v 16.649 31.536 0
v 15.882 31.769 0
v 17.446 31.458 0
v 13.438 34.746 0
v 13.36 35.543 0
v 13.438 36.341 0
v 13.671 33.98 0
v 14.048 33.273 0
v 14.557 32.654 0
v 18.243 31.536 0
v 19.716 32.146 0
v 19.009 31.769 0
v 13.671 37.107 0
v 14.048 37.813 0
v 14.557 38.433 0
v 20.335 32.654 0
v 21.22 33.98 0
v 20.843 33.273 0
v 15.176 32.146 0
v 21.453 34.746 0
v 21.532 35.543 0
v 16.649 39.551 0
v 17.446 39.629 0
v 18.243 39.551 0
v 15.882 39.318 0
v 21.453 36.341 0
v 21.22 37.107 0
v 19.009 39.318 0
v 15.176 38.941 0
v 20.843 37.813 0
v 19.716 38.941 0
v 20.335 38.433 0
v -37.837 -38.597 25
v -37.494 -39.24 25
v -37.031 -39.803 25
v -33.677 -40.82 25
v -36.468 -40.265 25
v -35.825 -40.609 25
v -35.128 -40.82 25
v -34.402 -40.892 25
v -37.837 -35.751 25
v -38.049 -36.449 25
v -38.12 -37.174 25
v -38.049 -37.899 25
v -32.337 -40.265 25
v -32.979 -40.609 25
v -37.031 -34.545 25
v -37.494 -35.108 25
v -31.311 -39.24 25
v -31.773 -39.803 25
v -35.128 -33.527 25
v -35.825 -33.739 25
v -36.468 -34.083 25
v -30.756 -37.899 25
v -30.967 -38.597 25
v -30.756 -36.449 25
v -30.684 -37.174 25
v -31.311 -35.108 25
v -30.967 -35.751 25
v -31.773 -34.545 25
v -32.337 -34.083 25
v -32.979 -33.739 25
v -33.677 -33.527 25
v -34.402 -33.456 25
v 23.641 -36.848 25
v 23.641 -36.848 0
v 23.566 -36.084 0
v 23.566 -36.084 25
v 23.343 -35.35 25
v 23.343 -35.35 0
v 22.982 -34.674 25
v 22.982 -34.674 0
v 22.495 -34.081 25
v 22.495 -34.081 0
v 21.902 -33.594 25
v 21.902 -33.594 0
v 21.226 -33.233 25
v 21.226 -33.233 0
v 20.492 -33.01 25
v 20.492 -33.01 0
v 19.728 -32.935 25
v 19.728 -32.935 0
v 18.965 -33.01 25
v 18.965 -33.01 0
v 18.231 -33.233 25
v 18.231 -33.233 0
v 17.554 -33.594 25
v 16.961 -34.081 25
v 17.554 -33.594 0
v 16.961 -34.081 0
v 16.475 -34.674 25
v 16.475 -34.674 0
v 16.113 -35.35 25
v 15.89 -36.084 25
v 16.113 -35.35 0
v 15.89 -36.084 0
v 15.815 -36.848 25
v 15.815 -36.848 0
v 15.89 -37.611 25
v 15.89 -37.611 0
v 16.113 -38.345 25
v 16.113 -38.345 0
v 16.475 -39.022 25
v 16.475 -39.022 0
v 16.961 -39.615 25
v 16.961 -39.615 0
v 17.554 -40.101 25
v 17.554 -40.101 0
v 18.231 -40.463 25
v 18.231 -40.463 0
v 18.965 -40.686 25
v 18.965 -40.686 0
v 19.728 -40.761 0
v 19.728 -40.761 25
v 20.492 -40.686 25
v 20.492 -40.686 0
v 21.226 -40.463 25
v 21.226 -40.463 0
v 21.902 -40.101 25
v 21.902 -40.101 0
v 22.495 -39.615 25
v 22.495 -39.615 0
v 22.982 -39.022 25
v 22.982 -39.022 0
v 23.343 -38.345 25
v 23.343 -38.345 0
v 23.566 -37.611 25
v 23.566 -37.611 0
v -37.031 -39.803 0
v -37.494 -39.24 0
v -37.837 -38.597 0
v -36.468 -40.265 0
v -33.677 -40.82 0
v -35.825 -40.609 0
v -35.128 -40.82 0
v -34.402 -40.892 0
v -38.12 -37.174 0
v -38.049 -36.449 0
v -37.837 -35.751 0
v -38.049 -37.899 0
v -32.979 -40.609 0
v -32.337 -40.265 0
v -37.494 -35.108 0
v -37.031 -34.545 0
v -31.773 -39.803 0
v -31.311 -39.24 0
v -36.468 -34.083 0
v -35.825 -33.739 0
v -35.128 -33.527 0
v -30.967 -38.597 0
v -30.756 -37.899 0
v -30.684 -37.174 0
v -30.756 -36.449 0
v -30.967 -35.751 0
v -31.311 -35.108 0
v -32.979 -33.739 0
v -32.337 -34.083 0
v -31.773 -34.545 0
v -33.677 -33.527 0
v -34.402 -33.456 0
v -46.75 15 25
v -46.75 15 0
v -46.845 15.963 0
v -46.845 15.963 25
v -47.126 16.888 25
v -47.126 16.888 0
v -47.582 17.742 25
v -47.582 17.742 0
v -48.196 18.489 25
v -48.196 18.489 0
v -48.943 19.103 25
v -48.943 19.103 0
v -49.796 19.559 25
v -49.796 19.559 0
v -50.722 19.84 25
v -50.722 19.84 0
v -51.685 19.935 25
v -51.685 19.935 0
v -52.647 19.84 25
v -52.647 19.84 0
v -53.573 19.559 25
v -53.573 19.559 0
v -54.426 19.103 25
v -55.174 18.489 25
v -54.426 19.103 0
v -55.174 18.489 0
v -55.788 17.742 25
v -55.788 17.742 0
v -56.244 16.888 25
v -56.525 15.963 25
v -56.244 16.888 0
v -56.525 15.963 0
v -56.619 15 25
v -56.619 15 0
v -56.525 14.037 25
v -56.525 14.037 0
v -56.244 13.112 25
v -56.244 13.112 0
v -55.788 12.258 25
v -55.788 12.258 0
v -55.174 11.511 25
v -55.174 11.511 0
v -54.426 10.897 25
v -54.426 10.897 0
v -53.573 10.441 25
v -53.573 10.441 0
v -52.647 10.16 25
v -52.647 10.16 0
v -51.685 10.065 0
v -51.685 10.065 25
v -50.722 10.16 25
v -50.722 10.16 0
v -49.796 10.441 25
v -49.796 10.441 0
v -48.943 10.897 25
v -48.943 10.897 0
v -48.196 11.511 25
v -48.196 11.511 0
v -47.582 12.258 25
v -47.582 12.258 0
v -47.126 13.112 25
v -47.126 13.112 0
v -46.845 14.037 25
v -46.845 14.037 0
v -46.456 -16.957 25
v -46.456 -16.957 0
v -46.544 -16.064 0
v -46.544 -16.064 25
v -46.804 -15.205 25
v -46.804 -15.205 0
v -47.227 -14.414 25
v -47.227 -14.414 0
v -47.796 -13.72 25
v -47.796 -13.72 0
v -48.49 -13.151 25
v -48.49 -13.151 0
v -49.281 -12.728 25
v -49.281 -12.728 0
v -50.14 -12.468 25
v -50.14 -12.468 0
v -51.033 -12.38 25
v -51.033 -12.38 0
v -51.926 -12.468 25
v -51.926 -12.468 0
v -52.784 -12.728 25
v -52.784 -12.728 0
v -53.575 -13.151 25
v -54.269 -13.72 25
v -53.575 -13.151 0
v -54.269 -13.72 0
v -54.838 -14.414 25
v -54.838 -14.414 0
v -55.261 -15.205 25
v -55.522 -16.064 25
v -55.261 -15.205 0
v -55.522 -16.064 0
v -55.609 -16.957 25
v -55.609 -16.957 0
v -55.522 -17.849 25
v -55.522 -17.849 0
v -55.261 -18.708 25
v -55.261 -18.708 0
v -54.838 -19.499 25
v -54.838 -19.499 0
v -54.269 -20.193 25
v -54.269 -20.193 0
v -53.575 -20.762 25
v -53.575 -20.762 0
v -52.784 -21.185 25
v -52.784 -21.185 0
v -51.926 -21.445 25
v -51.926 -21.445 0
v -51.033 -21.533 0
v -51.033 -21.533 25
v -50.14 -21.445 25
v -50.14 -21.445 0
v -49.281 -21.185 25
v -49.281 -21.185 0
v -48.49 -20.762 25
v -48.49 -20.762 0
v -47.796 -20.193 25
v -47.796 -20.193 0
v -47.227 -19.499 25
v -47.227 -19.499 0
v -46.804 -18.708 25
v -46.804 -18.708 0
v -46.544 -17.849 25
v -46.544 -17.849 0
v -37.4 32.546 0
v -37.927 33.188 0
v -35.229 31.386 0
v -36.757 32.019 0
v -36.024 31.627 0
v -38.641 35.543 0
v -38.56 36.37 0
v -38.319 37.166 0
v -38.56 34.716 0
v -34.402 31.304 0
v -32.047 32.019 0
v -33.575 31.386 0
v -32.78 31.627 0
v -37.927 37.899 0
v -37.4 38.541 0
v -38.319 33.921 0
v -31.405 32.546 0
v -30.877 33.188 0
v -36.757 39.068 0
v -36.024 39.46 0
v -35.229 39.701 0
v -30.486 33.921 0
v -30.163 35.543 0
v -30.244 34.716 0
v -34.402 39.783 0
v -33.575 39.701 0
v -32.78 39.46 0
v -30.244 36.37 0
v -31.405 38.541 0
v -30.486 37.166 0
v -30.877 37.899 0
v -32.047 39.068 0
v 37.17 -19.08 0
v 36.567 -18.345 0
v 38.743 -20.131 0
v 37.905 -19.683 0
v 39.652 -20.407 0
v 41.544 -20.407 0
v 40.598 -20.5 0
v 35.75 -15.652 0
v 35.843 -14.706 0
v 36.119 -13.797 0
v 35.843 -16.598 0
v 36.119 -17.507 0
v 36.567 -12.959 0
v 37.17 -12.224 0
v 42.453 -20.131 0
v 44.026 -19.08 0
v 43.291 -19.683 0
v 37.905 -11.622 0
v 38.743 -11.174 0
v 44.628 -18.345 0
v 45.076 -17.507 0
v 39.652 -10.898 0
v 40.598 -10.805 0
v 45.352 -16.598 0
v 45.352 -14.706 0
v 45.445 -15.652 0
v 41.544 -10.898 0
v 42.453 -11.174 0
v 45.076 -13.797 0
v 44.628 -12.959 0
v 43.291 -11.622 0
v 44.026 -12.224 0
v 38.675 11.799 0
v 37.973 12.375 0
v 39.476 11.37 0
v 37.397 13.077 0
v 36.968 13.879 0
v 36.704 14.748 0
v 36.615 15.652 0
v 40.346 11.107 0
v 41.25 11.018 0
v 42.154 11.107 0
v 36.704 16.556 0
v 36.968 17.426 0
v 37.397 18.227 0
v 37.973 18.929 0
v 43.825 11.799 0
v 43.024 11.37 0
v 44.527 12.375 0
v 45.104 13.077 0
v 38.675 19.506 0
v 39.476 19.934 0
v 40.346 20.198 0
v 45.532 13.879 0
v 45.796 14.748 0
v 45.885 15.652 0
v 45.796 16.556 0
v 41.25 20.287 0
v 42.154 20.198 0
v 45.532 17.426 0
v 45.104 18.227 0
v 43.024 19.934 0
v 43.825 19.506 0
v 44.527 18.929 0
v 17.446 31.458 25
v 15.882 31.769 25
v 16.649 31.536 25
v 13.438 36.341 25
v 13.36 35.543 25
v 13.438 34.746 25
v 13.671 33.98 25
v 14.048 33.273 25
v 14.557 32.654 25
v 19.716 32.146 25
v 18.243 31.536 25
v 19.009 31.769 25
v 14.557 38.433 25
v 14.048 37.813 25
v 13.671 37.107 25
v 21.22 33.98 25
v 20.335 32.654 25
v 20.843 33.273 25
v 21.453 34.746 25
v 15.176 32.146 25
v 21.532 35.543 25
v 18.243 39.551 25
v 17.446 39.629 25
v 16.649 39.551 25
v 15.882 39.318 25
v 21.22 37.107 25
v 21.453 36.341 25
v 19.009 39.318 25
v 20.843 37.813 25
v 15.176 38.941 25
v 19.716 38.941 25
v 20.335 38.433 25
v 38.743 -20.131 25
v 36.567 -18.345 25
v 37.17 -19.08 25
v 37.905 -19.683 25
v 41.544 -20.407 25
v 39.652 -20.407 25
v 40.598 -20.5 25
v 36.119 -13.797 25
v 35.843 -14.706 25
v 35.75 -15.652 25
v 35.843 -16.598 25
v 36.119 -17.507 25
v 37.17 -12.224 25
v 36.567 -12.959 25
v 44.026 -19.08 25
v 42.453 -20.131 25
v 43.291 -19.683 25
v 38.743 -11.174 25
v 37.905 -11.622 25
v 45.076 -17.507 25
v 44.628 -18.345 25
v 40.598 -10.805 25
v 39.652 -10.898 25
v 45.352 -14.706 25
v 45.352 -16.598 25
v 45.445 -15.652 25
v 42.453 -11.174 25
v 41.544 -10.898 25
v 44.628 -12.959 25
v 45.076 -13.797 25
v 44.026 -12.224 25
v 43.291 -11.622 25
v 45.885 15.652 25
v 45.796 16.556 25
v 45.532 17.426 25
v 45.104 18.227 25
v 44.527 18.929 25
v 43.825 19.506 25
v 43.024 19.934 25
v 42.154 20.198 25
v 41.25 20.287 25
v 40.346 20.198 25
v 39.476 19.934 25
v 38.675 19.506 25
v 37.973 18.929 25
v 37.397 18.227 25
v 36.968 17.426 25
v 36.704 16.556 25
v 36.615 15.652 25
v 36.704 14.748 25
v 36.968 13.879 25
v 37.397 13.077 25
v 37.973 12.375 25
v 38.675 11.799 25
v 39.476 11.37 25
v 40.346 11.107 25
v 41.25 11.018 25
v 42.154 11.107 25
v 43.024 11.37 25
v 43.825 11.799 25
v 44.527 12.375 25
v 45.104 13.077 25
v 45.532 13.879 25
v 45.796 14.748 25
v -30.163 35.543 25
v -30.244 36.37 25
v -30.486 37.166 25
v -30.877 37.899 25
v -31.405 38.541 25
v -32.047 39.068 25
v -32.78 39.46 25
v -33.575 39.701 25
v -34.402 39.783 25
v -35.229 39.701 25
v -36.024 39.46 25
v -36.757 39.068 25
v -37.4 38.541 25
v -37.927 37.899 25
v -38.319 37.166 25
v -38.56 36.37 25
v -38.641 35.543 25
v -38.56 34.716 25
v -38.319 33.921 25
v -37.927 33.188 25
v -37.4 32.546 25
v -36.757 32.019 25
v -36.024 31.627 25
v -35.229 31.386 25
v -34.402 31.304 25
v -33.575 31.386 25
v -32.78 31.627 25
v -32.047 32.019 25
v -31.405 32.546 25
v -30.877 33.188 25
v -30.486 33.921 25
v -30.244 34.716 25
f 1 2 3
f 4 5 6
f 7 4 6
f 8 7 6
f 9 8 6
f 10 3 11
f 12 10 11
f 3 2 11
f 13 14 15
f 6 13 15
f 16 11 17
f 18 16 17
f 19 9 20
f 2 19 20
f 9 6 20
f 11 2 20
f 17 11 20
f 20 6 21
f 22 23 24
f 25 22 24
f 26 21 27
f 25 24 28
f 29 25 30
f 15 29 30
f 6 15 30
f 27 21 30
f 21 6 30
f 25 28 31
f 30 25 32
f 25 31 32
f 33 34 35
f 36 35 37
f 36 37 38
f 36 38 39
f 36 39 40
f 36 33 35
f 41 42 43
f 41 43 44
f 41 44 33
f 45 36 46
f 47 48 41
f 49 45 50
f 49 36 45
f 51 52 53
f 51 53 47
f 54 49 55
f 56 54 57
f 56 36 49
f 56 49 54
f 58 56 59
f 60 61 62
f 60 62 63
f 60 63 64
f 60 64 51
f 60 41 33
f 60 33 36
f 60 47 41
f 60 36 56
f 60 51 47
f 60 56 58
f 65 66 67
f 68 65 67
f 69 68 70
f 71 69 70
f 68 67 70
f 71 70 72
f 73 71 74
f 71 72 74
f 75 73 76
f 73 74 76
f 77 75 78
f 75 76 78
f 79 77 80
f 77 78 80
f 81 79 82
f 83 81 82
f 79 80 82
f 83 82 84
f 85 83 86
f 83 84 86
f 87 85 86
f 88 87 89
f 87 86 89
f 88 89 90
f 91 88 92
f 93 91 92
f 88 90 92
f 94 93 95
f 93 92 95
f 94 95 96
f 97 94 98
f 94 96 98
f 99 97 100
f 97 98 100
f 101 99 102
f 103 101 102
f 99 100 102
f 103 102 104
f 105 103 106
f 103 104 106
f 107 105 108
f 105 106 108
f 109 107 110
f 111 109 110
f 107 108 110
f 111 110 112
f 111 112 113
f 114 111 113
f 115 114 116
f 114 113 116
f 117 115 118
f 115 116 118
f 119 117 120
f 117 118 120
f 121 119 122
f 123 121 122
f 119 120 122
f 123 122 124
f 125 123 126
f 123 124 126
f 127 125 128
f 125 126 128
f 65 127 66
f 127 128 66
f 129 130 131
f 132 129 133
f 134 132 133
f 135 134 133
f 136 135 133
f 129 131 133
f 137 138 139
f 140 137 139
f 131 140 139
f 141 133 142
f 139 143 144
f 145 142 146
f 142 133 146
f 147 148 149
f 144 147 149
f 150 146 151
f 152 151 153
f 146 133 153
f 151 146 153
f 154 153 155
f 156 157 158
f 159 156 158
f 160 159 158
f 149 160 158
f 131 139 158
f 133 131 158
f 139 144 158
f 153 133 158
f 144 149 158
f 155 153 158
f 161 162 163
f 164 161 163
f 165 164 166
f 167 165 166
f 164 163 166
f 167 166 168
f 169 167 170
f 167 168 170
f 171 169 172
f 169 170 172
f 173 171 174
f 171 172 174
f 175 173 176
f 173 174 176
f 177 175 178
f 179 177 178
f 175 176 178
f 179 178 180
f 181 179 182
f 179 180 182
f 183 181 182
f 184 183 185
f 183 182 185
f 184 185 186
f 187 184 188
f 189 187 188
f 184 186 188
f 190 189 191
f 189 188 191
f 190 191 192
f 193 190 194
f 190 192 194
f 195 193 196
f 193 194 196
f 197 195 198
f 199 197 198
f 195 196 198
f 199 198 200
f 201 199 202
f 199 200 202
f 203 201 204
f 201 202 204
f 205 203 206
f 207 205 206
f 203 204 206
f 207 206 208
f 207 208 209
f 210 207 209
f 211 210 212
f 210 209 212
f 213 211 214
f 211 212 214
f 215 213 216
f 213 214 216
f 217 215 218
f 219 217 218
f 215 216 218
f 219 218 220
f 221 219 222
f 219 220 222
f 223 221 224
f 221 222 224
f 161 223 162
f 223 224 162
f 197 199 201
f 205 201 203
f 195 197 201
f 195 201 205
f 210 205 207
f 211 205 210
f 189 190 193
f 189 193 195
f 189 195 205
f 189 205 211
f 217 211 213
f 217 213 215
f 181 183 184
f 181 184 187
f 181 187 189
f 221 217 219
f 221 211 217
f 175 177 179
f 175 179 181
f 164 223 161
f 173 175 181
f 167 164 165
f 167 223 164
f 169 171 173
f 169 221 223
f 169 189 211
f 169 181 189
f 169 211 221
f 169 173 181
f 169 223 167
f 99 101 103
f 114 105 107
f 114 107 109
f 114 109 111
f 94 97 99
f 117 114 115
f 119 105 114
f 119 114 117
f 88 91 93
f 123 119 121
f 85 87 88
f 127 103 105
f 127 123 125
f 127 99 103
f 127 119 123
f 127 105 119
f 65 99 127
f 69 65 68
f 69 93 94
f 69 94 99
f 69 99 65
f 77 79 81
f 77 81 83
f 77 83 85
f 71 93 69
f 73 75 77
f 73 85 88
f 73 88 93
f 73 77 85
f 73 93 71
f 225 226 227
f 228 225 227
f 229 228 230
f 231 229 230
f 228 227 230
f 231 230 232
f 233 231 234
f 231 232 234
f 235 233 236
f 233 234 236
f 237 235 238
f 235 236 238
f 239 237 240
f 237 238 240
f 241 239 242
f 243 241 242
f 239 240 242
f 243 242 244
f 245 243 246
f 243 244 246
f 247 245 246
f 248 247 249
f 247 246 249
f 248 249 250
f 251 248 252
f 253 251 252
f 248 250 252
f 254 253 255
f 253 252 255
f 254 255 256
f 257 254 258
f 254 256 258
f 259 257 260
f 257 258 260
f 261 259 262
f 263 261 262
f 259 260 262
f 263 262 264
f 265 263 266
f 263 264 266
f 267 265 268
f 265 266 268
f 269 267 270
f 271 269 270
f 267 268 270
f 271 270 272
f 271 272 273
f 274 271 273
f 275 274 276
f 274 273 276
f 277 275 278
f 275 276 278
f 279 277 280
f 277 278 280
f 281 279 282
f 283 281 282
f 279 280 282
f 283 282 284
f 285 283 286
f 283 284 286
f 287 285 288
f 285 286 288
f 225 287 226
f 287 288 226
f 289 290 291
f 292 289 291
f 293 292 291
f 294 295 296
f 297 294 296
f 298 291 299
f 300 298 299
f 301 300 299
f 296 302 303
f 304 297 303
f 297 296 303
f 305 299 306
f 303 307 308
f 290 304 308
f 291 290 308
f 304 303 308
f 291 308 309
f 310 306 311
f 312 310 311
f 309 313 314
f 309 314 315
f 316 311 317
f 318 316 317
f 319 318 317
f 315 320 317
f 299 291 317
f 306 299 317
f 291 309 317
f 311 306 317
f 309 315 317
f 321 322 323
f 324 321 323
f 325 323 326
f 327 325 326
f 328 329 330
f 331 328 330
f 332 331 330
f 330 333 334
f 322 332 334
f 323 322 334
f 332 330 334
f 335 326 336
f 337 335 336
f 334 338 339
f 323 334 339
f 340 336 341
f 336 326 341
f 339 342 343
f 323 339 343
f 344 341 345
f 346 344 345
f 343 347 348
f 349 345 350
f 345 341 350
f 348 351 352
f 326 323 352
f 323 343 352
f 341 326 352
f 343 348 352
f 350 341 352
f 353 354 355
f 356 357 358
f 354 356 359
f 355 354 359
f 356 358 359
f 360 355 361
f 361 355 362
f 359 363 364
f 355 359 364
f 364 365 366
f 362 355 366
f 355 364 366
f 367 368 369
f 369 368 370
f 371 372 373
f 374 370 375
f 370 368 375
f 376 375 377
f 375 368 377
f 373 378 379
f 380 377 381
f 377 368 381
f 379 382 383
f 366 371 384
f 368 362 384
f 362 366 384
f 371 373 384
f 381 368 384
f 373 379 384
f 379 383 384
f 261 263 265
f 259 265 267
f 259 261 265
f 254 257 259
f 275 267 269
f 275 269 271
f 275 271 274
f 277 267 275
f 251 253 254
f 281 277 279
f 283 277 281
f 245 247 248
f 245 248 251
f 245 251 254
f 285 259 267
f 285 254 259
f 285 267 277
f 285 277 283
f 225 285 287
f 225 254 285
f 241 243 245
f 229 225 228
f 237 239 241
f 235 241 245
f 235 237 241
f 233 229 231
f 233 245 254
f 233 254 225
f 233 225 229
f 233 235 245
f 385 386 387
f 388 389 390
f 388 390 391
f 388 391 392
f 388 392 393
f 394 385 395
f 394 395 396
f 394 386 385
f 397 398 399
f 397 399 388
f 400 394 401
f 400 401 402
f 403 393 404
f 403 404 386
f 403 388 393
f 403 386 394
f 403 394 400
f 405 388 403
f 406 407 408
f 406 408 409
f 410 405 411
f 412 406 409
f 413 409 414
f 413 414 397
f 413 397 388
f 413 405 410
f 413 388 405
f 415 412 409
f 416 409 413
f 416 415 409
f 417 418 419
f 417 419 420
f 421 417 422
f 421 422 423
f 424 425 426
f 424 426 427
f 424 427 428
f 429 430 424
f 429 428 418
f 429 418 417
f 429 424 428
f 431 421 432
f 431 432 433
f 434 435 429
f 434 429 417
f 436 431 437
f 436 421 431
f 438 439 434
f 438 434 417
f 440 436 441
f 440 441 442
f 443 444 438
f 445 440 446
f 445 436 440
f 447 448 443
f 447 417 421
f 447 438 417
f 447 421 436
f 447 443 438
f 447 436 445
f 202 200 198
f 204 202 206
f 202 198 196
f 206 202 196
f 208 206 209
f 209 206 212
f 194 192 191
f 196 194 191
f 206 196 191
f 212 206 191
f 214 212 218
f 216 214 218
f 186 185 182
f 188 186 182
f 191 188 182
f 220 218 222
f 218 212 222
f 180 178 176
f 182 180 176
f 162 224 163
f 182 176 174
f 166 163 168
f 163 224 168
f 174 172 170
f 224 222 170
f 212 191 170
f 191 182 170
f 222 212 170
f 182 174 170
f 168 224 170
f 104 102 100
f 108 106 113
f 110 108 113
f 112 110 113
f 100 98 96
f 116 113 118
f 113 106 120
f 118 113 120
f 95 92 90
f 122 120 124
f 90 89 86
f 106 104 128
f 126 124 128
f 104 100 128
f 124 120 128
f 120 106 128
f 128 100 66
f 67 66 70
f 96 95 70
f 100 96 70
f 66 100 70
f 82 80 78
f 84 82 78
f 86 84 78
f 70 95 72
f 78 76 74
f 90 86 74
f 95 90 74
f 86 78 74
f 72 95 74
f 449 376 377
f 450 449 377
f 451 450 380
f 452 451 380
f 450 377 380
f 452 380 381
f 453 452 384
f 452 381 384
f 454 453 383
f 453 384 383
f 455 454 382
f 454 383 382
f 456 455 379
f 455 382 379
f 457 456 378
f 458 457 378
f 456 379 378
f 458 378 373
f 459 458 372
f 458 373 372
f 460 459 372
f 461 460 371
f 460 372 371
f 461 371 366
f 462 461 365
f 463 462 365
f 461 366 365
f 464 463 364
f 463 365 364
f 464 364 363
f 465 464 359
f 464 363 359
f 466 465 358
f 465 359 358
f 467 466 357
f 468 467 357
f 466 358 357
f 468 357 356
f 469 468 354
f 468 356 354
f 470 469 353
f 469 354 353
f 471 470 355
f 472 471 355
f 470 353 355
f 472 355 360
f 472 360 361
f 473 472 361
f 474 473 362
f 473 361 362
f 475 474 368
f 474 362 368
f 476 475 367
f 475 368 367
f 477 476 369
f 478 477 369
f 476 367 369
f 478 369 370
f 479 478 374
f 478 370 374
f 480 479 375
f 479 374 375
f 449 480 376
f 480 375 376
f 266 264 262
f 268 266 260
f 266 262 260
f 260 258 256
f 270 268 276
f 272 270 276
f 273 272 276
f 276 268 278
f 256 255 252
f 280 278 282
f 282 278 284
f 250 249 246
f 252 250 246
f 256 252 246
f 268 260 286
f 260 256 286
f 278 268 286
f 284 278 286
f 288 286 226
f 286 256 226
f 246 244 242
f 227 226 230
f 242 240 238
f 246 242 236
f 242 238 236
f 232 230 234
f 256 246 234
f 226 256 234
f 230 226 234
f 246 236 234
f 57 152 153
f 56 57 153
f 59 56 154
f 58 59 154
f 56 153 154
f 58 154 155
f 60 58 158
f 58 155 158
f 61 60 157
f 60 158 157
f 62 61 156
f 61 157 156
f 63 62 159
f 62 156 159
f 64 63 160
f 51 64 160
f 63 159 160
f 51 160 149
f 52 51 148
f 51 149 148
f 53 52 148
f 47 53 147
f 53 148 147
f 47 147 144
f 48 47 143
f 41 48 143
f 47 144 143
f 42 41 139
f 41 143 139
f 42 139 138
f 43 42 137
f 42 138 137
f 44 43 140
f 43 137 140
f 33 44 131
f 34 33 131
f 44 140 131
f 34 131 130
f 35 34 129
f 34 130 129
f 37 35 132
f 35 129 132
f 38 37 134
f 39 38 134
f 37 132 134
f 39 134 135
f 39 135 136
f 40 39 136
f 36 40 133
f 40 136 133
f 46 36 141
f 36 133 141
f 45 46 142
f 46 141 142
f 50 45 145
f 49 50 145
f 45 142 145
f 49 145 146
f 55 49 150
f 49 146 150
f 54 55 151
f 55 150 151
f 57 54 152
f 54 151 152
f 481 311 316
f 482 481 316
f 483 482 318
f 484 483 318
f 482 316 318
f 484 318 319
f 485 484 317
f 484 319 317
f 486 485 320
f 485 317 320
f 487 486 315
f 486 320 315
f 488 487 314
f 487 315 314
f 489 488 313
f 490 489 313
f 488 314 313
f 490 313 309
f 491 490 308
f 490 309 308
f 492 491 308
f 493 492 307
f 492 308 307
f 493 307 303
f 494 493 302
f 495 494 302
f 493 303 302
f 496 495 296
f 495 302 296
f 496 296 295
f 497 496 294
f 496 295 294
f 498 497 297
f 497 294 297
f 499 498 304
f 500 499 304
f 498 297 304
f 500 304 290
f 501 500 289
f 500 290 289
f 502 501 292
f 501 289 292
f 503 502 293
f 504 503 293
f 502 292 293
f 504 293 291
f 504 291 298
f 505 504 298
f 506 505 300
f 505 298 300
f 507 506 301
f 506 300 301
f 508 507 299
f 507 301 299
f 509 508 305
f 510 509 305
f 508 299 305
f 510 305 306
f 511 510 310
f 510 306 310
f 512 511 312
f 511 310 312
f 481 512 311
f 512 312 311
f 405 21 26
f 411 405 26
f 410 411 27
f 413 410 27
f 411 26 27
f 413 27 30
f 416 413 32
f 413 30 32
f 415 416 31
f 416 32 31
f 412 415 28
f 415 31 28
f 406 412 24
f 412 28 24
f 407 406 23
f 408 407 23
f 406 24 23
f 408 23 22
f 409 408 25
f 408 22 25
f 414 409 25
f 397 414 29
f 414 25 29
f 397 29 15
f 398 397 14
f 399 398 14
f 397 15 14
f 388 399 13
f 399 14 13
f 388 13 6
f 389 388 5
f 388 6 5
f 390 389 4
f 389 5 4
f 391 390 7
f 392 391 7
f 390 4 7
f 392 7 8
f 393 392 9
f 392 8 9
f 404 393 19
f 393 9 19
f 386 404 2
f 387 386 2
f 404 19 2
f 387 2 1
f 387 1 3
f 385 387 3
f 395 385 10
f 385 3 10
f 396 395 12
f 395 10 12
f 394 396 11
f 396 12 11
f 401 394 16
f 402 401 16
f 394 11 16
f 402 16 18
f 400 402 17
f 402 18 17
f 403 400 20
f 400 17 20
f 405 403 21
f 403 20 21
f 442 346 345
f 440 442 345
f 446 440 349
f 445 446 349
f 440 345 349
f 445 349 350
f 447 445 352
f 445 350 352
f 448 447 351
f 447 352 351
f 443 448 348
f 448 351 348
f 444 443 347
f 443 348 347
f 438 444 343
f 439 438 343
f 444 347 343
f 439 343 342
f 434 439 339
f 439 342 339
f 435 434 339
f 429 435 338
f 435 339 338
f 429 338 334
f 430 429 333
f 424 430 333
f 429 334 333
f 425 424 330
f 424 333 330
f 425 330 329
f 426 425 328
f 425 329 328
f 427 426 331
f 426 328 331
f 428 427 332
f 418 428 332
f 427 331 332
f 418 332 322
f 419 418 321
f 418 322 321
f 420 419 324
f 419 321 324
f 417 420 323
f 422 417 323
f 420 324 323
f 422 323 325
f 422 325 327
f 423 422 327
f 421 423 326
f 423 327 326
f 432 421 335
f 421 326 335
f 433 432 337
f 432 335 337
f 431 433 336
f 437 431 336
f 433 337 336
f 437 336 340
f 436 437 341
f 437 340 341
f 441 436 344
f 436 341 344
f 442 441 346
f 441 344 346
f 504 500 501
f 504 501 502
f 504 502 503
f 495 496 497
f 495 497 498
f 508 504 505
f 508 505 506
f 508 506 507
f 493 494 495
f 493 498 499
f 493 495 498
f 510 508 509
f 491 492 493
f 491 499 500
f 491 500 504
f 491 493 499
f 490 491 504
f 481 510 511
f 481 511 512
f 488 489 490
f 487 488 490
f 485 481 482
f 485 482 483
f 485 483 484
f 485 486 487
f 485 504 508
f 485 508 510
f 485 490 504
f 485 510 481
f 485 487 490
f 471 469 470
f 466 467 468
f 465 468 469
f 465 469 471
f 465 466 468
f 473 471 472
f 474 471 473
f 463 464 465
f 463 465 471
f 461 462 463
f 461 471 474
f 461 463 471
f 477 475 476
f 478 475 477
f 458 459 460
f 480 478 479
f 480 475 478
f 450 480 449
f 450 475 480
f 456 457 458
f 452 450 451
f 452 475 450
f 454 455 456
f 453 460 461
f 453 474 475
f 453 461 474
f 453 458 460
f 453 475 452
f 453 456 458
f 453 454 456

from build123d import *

# Parameters (mm, degrees)
F1_R     = 4.239133
F1_R_2   = 4.085857
F1_R_3   = 4.634566
F1_R_4   = 4.847632
F1_R_5   = 3.913043
F1_R_6   = 3.717962
F1_R_7   = 4.576848
F1_R_8   = 4.934592
F2_DEPTH = 25


with BuildPart() as f2:
    # F1 (on face) → F2 (new body)
    with BuildSketch(Plane.XY):
        with Locations((-34.402177, 35.543479)):
            Circle(F1_R)
        with Locations((17.445652, 35.543479)):
            Circle(F1_R_2)
        with Locations((41.250002, 15.652174)):
            Circle(F1_R_3)
        with Locations((40.59783, -15.652174)):
            Circle(F1_R_4)
        with Locations((19.72826, -36.847826)):
            Circle(F1_R_5)
        with Locations((-34.402177, -37.173916)):
            Circle(F1_R_6)
        with Locations((-51.03261, -16.956523)):
            Circle(F1_R_7)
        with Locations((-51.684786, 15.000001)):
            Circle(F1_R_8)
    extrude(amount=F2_DEPTH)


solid = f2.part
